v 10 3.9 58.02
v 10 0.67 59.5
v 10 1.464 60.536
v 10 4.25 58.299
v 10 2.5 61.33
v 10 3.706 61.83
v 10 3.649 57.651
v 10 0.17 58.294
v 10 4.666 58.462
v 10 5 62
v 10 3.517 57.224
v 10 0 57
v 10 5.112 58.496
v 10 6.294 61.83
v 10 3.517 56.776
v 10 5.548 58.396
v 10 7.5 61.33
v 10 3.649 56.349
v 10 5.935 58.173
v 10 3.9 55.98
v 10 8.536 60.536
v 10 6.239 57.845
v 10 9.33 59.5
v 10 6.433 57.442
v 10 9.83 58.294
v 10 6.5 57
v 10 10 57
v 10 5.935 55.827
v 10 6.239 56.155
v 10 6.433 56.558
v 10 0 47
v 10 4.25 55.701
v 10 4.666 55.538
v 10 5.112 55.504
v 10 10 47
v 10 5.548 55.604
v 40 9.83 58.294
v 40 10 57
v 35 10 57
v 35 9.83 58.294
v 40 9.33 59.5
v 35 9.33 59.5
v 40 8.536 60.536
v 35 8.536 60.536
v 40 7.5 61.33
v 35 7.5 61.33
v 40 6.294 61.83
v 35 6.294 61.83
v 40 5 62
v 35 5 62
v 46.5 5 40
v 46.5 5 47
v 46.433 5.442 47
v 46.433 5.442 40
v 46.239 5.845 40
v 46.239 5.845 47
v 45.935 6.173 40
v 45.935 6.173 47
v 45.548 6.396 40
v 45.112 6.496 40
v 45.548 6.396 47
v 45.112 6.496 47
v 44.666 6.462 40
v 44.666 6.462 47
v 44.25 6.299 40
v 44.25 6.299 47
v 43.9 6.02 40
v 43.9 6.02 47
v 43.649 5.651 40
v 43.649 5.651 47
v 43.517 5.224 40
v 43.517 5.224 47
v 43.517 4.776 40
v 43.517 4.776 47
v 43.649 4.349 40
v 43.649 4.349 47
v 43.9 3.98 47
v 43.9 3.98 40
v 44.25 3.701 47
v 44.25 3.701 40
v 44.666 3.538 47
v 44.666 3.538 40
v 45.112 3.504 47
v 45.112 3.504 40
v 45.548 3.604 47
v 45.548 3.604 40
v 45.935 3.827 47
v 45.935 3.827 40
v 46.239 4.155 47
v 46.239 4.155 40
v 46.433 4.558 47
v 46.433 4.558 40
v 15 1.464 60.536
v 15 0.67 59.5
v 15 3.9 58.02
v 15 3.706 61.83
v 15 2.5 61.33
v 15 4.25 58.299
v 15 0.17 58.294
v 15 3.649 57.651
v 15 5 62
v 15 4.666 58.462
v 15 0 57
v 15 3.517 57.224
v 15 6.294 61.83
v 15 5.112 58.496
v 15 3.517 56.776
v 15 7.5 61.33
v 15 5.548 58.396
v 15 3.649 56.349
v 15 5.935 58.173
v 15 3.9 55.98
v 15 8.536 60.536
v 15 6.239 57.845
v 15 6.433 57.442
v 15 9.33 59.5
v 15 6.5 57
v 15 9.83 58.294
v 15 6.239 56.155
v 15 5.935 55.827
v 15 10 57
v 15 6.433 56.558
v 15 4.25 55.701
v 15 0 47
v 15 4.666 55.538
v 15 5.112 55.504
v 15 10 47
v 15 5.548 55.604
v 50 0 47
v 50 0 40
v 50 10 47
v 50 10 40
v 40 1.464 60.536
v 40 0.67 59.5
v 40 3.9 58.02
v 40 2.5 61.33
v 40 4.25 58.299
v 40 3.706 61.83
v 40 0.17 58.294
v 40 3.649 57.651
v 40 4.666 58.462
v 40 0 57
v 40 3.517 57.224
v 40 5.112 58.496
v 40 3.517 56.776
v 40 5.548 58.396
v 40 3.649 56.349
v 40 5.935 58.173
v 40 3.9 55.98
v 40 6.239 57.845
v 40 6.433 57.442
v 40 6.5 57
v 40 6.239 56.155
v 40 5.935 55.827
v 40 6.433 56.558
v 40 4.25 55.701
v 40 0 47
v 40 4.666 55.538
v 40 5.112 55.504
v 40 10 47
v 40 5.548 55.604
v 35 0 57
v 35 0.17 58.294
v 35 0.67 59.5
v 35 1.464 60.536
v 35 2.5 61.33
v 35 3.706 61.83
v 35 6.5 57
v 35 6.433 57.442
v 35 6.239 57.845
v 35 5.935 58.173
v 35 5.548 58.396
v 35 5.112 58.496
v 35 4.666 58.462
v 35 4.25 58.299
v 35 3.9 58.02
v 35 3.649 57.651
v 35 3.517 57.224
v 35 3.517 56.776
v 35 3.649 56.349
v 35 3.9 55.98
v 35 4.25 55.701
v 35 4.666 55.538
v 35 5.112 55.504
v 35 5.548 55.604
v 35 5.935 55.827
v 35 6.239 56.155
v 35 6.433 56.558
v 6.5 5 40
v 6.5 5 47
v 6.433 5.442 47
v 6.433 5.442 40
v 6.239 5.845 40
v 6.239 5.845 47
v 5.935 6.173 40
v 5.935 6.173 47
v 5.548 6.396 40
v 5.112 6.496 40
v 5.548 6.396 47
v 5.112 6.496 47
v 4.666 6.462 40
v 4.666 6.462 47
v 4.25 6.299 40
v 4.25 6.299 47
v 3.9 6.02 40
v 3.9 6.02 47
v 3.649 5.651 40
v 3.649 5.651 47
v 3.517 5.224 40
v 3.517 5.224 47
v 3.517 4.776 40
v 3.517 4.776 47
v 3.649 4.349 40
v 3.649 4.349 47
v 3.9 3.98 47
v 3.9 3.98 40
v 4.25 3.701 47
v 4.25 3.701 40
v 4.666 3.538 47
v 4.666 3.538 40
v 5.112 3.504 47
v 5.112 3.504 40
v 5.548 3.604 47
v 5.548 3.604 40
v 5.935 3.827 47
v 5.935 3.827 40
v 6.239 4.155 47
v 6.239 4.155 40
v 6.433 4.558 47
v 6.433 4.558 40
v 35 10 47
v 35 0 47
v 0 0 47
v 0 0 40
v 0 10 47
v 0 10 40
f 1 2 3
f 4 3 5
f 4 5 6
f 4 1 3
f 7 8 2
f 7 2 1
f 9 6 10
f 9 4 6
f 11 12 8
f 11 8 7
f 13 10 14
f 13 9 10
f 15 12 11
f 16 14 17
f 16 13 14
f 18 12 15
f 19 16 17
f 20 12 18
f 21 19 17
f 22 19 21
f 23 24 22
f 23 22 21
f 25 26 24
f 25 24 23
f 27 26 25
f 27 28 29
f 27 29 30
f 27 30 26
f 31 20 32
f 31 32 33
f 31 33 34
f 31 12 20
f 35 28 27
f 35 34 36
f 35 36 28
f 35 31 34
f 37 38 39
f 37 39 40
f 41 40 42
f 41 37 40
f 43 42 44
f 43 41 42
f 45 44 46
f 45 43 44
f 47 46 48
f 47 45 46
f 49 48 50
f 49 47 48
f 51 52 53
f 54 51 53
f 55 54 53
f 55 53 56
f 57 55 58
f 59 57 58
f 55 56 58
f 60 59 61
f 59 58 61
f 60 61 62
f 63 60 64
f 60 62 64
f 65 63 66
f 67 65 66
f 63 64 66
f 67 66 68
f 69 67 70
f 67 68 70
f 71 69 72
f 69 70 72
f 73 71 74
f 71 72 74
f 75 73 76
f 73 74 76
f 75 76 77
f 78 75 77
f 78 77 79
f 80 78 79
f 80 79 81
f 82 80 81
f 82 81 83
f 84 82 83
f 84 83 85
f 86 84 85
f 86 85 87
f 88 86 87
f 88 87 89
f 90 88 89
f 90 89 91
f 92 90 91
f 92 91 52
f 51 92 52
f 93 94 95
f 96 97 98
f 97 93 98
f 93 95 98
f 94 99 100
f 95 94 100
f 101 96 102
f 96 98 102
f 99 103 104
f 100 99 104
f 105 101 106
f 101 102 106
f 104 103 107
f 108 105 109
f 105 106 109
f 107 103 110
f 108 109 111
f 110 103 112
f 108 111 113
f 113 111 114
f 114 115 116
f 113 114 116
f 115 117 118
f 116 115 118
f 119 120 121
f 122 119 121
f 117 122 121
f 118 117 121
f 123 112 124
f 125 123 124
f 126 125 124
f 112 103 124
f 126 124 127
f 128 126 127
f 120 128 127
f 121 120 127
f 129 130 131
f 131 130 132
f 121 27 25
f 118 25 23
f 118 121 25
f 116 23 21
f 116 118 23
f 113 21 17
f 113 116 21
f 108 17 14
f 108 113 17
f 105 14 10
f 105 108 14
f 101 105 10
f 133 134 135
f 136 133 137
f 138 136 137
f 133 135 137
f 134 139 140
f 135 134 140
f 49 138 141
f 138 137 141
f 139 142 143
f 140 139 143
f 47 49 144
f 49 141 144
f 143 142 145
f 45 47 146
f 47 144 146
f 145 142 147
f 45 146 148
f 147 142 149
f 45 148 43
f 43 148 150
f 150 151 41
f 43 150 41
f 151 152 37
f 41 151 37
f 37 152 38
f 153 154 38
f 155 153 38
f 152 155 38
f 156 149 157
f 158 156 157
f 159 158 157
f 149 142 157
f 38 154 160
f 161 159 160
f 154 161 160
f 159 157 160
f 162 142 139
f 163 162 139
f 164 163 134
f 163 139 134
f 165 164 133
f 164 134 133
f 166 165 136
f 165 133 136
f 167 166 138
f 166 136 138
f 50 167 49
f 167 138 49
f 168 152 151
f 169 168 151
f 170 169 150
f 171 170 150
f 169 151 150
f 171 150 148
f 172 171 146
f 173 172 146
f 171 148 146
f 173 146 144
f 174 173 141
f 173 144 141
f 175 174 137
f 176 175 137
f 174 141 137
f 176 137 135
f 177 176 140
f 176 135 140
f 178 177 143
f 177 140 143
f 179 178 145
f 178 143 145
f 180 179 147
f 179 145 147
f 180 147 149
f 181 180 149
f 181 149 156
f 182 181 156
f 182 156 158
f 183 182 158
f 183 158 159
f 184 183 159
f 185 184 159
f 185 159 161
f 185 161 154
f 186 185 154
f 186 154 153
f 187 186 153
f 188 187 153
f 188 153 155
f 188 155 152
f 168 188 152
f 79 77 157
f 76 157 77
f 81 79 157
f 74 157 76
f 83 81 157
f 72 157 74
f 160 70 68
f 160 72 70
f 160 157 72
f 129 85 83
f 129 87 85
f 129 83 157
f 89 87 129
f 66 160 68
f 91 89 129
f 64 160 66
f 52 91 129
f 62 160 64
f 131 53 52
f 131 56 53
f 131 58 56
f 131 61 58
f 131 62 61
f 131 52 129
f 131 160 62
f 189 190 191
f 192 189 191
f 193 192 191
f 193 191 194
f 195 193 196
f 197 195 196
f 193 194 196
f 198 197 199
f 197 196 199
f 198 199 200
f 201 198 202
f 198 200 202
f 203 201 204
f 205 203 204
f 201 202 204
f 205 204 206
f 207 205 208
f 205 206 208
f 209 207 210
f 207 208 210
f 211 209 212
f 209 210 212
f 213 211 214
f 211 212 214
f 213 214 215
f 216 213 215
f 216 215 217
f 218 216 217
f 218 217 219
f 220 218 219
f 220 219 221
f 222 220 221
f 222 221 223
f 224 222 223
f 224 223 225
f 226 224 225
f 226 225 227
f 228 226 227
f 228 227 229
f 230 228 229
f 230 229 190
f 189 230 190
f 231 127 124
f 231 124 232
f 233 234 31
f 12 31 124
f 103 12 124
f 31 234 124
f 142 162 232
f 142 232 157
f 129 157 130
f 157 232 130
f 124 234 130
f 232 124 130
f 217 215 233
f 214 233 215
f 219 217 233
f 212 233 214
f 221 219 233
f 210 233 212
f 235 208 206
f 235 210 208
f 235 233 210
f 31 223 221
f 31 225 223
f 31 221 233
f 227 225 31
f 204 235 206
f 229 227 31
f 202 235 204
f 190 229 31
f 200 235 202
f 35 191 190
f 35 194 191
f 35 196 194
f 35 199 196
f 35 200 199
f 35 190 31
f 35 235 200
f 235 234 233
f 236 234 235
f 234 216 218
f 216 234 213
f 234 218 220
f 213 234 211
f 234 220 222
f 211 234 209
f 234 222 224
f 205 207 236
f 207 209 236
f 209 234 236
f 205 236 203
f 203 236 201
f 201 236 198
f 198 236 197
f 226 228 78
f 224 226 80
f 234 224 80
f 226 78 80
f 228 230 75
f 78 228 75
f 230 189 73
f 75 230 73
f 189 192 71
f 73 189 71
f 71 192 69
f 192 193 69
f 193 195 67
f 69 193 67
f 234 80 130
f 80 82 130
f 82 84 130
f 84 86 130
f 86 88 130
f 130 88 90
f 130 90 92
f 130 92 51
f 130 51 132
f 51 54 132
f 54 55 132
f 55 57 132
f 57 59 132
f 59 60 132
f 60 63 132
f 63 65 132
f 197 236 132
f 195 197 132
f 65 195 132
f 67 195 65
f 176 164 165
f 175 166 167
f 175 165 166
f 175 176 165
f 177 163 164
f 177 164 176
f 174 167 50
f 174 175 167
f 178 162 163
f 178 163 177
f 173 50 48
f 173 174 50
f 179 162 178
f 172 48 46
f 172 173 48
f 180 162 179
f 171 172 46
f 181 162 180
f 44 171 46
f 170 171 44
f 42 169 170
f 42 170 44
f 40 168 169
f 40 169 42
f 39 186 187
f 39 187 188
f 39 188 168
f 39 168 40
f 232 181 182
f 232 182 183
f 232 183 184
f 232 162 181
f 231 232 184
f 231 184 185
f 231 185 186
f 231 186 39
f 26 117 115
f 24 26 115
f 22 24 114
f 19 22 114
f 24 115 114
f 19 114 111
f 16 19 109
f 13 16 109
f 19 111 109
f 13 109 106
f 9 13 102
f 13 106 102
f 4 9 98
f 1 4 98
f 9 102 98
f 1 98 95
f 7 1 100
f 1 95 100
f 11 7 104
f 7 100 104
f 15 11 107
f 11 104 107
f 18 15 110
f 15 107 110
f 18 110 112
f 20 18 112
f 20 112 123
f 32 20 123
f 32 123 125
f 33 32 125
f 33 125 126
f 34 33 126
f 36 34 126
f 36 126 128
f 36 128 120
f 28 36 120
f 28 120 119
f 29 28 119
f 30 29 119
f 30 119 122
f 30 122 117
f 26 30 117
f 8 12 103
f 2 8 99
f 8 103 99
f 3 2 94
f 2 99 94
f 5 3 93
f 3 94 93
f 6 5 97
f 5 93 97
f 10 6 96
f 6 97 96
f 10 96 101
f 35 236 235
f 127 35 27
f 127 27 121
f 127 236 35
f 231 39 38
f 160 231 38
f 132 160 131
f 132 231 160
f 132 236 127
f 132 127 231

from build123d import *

# Parameters (mm, degrees)
F0_W      = 50
F0_H      = 10
F1_DEPTH  = 7
F2_W      = 30
F2_H      = 10
F4_DEPTH  = 15
F5_R      = 4.99999
F3_R      = 1.5
F6_DEPTH  = 25
F7_R      = 1.5
F8_DEPTH  = 50
F10_W     = 20
F10_H     = 10
F11_DEPTH = 25


# Not quite as in the source:
# - a fillet or chamfer is up to 0.001 mm smaller than in the source, because OpenCascade refuses the exact size


with BuildPart() as f1:
    # F0 (on Top) → F1 (new body)
    with BuildSketch(Plane.XY):
        with Locations((25, 5)):
            Rectangle(F0_W, F0_H)
    extrude(amount=F1_DEPTH)

    # F2 (on face) → F4 (join)
    with BuildSketch(Plane.XY.offset(7)):
        with Locations((25, 5)):
            Rectangle(F2_W, F2_H)
    extrude(amount=F4_DEPTH)

    # F5 (radius 5 in the source; OpenCascade refuses exactly that, so slightly less here)
    f5_edges = [f1.edges().sort_by_distance(p)[0] for p in [
        (25, 10, 22),
        (25, 0, 22),
    ]]
    fillet(f5_edges, radius=F5_R)

    # F3 (on face) → F6 (cut)
    with BuildSketch(Plane.XY.offset(7)):
        with Locations((45, 5)):
            Circle(F3_R)
        with Locations((5, 5)):
            Circle(F3_R)
    extrude(amount=-F6_DEPTH, mode=Mode.SUBTRACT)

    # F7 (on face) → F8 (cut)
    with BuildSketch(Plane.YZ.offset(40)):
        with Locations((5, 17)):
            Circle(F7_R)
    extrude(amount=-F8_DEPTH, mode=Mode.SUBTRACT)


with BuildPart() as f9_1:
    # F9: copy of F1
    add(f1.part.moved(Location((0, 0, 40))))

    # F10 (on face) → F11 (cut)
    with BuildSketch(Plane.XY.offset(47)):
        with Locations((25, 5)):
            Rectangle(F10_W, F10_H)
    extrude(amount=F11_DEPTH, mode=Mode.SUBTRACT)


solid = f9_1.part
